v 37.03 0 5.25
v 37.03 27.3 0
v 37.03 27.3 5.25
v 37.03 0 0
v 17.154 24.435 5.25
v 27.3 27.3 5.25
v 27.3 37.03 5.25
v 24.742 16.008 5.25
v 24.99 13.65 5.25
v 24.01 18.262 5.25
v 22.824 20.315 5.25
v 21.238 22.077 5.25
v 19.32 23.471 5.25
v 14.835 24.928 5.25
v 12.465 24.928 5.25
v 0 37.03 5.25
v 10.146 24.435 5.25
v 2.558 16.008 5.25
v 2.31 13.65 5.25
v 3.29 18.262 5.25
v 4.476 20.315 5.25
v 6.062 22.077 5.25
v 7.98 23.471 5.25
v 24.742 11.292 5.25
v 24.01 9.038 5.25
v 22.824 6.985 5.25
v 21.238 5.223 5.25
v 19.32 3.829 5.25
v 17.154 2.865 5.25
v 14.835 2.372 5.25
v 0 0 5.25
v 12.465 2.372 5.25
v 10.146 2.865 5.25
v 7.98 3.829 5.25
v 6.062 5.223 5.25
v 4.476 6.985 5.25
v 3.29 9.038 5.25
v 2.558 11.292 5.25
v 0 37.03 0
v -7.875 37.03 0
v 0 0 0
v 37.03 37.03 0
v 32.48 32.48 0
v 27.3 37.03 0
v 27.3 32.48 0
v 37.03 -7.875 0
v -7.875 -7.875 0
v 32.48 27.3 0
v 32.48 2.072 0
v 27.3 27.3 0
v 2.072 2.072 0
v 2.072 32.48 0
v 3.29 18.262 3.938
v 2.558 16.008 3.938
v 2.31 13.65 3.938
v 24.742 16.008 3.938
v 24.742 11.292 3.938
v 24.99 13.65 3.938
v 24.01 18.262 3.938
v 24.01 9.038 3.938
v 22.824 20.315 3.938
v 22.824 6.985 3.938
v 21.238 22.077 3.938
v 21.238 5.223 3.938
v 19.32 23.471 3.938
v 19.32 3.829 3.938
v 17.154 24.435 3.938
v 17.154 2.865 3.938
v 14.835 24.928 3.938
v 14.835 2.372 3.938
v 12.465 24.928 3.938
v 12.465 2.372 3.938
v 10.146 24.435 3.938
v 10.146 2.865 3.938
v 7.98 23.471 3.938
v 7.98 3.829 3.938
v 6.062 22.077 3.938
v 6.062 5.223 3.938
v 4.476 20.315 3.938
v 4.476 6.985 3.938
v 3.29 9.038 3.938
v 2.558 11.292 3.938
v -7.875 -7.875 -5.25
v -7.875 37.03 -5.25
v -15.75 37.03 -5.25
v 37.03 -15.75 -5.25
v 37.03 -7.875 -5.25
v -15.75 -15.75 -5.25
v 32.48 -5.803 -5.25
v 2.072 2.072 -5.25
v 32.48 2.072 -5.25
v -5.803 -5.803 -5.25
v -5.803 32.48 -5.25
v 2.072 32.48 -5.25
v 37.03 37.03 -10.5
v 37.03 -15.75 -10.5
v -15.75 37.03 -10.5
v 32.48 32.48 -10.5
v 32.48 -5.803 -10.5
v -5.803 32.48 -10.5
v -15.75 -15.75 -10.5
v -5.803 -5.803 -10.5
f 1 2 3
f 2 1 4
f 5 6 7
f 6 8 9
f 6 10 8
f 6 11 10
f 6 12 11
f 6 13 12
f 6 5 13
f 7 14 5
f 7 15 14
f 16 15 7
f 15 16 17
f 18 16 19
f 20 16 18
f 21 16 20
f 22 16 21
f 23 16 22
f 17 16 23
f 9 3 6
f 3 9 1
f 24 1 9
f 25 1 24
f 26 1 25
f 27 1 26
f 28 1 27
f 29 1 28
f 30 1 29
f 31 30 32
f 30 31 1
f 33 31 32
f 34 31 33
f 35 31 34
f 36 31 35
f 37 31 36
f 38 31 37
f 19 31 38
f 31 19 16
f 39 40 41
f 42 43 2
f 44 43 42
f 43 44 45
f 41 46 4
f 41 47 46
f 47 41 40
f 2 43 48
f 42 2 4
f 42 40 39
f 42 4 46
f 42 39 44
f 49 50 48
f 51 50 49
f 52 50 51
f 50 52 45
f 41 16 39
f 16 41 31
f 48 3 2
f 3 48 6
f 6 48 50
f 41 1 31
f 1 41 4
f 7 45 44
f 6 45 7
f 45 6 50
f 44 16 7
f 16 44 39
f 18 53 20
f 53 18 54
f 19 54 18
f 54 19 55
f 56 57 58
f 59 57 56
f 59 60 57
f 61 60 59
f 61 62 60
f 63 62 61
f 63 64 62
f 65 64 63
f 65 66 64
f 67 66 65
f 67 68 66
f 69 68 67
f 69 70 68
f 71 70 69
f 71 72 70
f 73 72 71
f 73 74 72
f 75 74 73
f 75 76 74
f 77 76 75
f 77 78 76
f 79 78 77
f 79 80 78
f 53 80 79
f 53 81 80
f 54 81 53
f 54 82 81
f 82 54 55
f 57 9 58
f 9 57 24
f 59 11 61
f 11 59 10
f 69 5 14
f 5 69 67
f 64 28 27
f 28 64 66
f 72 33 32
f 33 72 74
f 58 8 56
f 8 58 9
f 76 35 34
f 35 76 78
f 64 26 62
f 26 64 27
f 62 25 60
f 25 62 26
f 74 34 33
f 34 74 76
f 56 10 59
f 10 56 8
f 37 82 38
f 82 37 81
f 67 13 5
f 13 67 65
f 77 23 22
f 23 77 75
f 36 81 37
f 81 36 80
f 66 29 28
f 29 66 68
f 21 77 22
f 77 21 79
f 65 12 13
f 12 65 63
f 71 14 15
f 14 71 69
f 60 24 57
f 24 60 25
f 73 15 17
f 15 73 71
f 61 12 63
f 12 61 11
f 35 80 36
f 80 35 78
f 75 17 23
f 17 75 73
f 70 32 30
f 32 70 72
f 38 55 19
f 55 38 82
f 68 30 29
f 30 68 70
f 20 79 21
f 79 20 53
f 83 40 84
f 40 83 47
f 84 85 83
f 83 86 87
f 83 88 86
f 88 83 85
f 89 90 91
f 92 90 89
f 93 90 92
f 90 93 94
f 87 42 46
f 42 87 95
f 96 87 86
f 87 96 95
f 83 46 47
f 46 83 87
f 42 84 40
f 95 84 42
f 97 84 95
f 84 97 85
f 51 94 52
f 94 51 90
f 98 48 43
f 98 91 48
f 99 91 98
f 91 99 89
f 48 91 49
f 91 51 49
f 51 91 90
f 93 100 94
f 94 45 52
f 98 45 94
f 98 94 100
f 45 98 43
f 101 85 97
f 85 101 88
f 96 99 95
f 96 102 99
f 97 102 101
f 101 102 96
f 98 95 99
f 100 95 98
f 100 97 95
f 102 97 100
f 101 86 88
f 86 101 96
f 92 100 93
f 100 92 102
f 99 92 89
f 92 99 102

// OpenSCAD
coldiameter = 16;
mod = coldiameter;
colheight = 82;
cbdiameter = 21;				//diameter of column base (for inset)
b_length = colheight/1.618;
b_width = cbdiameter *1.3;
b_height = cbdiameter/4;
step_width = b_height * 1.5;

//straight_base();
//translate([0,b_width+15,0]) straight_base();
//steps(2);
//corner_base();
//corner_steps(2);
//step_unit(2);
corner_unit(2);

module corner_unit(flights) {
	corner_base();
	rotate([0,0,180]) translate([-b_length+b_width/2,-b_length+b_width/2,0]) 
		corner_steps(flights);
}

module step_unit(flights) {
	rotate([0,0,180]) translate([-b_length*2+b_width/2,-b_width,0]) 
	 	union() { straight_base(); steps(flights);}
}

module large_corner_unit(flights) {
	rotate([0,0,180]) translate([-b_length*2+b_width/2,-b_width,0]) 
	 	union() { straight_base(); steps(flights);}
	translate([b_width,b_length-b_width/2,0]) rotate([0,0,90]) 
		union() { straight_base(); steps(flights);}
	corner_base();
	rotate([0,0,180]) translate([-b_length+b_width/2,-b_length+b_width/2,0]) 
		corner_steps(flights);
}

module corner_steps(flights) {
for ( i = [1 : flights] ) {
	translate([0,0,-b_height*i])
	difference() {
		cube([b_length-b_width/2+(step_width*i),b_length-b_width/2+(step_width*i),b_height]);
		translate([b_width/6,b_width/6,0])
		cube([b_length-b_length/2.5+(step_width*(i-1)),b_length-b_length/2.5+(step_width*(i-1)),b_height+b_height/10]);
	}
	}
}

module steps(flights) {
for ( i = [1 : flights] ) {
	translate([0,0,-b_height*i])
	difference() {
		cube([b_length,(step_width*i)+b_width,b_height]);
		translate([b_length/10,b_width/10,0])
		cube([b_length-b_length/5,b_width-b_width/10+(step_width*(i-1)),b_height+b_height/10]);
	}
//	difference () {
		translate([0,-b_width/3,-b_height*i])  cube([b_length,b_width/3,b_height]);

//	}
	}
}

module corner_base() {
difference() {
	union() {
	cube([b_length-b_width/2,b_width,b_height]);
	cube([b_width, b_length-b_width/2, b_height]);
	}
	translate([b_width/2,b_width/2,b_height*.75])
		cylinder(h=b_height*.5,r=cbdiameter*.54);
	}
}

module straight_base() {
difference() {
	cube([b_length,b_width,b_height]);
	translate([b_length/2,b_width/2,b_height*.75])
		cylinder(h=b_height*.5,r=cbdiameter*.54);   //fudge factor
	translate([b_length/20,b_width/5,0])
		cube([b_length/2-(b_length/10),b_width-(2*b_width/5),b_height/2]);
	translate([b_length/20+b_length/2,b_width/5,0])
		cube([b_length/2-(b_length/10),b_width-(2*b_width/5),b_height/2]);}
}
